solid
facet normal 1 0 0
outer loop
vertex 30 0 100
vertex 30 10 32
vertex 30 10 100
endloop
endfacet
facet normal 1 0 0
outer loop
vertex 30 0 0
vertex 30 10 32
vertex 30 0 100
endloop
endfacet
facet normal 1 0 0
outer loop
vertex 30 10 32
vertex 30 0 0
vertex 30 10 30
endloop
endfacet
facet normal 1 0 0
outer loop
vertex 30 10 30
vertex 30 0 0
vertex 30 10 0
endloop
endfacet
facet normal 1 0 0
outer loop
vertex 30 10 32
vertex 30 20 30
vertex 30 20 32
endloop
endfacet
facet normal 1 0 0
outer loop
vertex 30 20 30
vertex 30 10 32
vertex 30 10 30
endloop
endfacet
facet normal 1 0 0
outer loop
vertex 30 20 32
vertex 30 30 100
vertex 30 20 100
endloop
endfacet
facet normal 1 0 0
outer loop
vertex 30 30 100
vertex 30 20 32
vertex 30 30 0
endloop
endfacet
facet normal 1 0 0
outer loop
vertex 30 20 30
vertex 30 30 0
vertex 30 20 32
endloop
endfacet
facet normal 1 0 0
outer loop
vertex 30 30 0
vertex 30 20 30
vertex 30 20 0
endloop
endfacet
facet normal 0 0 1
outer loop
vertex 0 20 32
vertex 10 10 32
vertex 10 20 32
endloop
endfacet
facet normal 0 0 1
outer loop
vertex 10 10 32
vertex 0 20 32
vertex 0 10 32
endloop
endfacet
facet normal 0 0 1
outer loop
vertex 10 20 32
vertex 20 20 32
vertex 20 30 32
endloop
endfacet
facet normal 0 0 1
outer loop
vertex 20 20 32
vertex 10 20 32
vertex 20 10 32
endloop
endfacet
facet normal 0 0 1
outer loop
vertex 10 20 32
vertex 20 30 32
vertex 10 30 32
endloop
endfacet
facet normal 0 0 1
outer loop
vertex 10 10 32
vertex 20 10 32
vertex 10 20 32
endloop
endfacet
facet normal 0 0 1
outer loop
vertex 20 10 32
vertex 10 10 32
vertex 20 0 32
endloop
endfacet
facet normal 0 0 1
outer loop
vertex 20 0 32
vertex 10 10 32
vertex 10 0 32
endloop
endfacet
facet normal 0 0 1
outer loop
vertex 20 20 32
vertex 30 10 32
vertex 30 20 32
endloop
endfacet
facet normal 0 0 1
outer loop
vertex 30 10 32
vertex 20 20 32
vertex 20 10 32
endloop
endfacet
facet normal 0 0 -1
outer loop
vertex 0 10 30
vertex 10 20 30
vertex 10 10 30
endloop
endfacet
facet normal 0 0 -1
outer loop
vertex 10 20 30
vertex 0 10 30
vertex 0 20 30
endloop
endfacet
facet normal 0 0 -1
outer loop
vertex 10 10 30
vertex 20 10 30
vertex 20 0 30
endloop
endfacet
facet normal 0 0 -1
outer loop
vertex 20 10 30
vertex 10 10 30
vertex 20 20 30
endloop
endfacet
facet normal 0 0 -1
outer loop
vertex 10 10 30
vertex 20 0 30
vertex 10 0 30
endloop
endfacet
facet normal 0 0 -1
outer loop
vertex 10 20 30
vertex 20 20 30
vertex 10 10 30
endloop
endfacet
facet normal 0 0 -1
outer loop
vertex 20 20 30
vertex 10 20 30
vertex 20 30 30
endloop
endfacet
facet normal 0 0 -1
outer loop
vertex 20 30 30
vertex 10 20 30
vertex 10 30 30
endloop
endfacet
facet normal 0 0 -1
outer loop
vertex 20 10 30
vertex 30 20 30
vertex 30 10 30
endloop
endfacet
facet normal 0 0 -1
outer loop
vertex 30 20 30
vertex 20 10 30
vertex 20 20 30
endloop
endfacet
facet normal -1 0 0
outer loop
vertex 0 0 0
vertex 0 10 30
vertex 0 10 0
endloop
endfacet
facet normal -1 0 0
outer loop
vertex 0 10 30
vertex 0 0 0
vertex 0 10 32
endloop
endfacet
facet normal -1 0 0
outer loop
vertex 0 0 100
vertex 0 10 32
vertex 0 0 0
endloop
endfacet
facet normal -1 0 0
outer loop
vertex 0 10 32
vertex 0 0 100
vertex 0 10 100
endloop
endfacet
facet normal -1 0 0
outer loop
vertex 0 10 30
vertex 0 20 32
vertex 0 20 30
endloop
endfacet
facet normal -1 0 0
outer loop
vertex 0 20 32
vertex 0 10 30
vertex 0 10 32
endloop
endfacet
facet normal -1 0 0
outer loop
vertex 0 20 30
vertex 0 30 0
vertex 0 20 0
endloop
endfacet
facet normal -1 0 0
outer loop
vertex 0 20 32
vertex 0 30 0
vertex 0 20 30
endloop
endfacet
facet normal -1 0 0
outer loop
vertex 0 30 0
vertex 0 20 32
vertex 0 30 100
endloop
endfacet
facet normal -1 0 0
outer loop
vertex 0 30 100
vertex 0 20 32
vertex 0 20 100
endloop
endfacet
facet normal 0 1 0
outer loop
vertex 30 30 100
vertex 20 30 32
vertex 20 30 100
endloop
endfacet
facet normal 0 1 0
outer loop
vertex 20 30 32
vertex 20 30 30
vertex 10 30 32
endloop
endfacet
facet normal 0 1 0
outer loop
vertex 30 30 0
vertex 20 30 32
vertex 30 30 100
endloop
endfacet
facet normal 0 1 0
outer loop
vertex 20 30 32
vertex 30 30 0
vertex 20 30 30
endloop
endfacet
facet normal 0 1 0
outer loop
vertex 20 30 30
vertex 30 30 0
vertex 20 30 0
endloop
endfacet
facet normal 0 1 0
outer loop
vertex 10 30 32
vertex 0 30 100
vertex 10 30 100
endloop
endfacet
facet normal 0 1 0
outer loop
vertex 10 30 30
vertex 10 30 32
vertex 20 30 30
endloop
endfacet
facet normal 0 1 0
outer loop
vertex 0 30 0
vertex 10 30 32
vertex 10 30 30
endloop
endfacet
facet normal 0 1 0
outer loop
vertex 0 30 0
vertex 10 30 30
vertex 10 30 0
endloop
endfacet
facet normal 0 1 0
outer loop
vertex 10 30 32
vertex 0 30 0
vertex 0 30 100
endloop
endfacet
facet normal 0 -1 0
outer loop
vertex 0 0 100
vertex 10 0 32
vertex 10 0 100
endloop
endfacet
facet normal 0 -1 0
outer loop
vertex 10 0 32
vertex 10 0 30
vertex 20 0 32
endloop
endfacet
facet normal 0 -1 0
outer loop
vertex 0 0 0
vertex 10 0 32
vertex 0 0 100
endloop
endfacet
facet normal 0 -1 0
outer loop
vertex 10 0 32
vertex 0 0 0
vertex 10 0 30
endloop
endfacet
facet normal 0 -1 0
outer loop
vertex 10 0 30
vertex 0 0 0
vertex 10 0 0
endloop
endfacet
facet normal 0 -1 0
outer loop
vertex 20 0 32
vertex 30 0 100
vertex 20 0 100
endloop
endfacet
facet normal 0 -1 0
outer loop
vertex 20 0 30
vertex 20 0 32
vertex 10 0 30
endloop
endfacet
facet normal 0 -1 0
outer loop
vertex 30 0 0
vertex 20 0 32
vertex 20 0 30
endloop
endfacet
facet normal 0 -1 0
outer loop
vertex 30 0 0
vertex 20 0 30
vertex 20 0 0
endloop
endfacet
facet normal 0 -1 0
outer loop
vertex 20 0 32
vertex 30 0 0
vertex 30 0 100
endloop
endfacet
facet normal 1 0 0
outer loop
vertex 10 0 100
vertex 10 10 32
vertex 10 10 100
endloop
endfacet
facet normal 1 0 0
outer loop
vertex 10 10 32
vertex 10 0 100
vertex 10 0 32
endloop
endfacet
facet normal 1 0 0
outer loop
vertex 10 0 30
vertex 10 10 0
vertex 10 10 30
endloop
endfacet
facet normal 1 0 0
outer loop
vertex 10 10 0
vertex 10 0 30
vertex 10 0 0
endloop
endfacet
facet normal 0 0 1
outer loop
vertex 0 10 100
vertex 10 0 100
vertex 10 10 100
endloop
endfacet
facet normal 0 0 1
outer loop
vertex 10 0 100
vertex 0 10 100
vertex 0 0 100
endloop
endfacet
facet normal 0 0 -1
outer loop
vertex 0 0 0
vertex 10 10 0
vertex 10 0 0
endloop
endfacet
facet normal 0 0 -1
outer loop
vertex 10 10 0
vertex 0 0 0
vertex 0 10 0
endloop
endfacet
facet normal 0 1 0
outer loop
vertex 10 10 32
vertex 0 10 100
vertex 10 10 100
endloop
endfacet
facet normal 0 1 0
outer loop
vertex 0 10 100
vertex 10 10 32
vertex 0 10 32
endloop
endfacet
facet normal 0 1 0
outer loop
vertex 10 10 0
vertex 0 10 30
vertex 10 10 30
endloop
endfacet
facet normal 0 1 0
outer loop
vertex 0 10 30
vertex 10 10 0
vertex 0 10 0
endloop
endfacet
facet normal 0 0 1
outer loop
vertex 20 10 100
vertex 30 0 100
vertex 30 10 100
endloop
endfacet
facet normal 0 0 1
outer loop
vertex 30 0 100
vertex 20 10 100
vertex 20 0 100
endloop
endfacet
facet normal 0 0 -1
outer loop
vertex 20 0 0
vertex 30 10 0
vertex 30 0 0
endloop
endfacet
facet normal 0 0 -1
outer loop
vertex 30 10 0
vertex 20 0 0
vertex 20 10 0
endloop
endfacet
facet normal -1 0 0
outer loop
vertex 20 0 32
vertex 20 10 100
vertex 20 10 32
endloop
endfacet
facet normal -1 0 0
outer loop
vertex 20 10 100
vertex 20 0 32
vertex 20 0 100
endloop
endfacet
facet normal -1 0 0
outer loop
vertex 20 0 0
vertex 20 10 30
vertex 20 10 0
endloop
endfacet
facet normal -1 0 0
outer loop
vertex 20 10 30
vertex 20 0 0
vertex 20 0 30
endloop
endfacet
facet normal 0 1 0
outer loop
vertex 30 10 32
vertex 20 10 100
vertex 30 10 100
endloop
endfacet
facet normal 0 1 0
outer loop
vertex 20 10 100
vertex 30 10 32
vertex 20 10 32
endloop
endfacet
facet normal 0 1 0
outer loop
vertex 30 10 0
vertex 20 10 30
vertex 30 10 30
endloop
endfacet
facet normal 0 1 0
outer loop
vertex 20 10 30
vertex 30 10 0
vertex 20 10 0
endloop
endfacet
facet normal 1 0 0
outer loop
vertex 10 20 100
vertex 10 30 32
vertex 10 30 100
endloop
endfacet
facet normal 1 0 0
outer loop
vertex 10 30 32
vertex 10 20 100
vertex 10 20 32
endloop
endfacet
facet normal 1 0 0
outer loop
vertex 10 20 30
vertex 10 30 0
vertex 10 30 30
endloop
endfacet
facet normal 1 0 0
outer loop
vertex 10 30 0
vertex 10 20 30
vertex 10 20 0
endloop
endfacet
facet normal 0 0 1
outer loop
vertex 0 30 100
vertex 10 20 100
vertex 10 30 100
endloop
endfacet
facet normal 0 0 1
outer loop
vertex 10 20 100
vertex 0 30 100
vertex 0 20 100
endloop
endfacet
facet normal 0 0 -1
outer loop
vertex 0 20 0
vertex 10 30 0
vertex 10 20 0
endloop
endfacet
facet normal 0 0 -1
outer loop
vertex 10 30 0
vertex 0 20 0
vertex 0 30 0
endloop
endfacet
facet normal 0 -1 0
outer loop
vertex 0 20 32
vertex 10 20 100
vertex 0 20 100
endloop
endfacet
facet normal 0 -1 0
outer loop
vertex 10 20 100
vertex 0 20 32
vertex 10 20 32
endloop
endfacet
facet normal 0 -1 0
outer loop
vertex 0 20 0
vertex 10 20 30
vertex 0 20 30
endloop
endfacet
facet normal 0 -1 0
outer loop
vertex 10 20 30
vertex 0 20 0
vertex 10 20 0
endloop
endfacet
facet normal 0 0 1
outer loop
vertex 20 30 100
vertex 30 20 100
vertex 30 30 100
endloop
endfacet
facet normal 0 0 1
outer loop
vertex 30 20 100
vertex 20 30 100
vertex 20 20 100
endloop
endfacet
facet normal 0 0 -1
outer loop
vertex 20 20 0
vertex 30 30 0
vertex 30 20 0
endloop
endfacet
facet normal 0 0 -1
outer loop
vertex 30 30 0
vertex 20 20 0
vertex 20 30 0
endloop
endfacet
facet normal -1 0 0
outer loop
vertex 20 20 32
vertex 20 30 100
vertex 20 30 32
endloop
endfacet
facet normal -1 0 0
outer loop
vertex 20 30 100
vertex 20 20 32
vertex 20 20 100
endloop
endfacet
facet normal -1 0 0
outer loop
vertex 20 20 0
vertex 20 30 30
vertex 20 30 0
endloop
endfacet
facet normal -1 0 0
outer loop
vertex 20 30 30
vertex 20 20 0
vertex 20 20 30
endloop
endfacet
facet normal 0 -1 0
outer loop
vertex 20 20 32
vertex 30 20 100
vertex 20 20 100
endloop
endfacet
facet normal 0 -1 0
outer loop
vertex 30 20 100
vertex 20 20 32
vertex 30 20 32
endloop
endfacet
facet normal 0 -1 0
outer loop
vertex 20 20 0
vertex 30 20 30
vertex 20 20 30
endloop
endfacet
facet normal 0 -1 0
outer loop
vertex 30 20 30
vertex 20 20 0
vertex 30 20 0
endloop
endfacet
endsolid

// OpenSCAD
module H(leg_height, leg_width, table_height, table_width, table_thickness){
	union(){
		translate([0, 0, table_height])
			cube([table_width, table_width, table_thickness]);
		cube([leg_width, leg_width, leg_height]);
		translate([table_width - leg_width, 0, 0])
			cube([leg_width, leg_width, leg_height]);
		translate([0, table_width - leg_width, 0])
			cube([leg_width, leg_width, leg_height]);
		translate([table_width - leg_width, table_width - leg_width, 0])
			cube([leg_width, leg_width, leg_height]);
	}
}

leg_height = 100;
leg_width = 10;
table_height = 30;
table_width = 30;
table_thickness = 2;
H(leg_height, leg_width, table_height, table_width, table_thickness);
